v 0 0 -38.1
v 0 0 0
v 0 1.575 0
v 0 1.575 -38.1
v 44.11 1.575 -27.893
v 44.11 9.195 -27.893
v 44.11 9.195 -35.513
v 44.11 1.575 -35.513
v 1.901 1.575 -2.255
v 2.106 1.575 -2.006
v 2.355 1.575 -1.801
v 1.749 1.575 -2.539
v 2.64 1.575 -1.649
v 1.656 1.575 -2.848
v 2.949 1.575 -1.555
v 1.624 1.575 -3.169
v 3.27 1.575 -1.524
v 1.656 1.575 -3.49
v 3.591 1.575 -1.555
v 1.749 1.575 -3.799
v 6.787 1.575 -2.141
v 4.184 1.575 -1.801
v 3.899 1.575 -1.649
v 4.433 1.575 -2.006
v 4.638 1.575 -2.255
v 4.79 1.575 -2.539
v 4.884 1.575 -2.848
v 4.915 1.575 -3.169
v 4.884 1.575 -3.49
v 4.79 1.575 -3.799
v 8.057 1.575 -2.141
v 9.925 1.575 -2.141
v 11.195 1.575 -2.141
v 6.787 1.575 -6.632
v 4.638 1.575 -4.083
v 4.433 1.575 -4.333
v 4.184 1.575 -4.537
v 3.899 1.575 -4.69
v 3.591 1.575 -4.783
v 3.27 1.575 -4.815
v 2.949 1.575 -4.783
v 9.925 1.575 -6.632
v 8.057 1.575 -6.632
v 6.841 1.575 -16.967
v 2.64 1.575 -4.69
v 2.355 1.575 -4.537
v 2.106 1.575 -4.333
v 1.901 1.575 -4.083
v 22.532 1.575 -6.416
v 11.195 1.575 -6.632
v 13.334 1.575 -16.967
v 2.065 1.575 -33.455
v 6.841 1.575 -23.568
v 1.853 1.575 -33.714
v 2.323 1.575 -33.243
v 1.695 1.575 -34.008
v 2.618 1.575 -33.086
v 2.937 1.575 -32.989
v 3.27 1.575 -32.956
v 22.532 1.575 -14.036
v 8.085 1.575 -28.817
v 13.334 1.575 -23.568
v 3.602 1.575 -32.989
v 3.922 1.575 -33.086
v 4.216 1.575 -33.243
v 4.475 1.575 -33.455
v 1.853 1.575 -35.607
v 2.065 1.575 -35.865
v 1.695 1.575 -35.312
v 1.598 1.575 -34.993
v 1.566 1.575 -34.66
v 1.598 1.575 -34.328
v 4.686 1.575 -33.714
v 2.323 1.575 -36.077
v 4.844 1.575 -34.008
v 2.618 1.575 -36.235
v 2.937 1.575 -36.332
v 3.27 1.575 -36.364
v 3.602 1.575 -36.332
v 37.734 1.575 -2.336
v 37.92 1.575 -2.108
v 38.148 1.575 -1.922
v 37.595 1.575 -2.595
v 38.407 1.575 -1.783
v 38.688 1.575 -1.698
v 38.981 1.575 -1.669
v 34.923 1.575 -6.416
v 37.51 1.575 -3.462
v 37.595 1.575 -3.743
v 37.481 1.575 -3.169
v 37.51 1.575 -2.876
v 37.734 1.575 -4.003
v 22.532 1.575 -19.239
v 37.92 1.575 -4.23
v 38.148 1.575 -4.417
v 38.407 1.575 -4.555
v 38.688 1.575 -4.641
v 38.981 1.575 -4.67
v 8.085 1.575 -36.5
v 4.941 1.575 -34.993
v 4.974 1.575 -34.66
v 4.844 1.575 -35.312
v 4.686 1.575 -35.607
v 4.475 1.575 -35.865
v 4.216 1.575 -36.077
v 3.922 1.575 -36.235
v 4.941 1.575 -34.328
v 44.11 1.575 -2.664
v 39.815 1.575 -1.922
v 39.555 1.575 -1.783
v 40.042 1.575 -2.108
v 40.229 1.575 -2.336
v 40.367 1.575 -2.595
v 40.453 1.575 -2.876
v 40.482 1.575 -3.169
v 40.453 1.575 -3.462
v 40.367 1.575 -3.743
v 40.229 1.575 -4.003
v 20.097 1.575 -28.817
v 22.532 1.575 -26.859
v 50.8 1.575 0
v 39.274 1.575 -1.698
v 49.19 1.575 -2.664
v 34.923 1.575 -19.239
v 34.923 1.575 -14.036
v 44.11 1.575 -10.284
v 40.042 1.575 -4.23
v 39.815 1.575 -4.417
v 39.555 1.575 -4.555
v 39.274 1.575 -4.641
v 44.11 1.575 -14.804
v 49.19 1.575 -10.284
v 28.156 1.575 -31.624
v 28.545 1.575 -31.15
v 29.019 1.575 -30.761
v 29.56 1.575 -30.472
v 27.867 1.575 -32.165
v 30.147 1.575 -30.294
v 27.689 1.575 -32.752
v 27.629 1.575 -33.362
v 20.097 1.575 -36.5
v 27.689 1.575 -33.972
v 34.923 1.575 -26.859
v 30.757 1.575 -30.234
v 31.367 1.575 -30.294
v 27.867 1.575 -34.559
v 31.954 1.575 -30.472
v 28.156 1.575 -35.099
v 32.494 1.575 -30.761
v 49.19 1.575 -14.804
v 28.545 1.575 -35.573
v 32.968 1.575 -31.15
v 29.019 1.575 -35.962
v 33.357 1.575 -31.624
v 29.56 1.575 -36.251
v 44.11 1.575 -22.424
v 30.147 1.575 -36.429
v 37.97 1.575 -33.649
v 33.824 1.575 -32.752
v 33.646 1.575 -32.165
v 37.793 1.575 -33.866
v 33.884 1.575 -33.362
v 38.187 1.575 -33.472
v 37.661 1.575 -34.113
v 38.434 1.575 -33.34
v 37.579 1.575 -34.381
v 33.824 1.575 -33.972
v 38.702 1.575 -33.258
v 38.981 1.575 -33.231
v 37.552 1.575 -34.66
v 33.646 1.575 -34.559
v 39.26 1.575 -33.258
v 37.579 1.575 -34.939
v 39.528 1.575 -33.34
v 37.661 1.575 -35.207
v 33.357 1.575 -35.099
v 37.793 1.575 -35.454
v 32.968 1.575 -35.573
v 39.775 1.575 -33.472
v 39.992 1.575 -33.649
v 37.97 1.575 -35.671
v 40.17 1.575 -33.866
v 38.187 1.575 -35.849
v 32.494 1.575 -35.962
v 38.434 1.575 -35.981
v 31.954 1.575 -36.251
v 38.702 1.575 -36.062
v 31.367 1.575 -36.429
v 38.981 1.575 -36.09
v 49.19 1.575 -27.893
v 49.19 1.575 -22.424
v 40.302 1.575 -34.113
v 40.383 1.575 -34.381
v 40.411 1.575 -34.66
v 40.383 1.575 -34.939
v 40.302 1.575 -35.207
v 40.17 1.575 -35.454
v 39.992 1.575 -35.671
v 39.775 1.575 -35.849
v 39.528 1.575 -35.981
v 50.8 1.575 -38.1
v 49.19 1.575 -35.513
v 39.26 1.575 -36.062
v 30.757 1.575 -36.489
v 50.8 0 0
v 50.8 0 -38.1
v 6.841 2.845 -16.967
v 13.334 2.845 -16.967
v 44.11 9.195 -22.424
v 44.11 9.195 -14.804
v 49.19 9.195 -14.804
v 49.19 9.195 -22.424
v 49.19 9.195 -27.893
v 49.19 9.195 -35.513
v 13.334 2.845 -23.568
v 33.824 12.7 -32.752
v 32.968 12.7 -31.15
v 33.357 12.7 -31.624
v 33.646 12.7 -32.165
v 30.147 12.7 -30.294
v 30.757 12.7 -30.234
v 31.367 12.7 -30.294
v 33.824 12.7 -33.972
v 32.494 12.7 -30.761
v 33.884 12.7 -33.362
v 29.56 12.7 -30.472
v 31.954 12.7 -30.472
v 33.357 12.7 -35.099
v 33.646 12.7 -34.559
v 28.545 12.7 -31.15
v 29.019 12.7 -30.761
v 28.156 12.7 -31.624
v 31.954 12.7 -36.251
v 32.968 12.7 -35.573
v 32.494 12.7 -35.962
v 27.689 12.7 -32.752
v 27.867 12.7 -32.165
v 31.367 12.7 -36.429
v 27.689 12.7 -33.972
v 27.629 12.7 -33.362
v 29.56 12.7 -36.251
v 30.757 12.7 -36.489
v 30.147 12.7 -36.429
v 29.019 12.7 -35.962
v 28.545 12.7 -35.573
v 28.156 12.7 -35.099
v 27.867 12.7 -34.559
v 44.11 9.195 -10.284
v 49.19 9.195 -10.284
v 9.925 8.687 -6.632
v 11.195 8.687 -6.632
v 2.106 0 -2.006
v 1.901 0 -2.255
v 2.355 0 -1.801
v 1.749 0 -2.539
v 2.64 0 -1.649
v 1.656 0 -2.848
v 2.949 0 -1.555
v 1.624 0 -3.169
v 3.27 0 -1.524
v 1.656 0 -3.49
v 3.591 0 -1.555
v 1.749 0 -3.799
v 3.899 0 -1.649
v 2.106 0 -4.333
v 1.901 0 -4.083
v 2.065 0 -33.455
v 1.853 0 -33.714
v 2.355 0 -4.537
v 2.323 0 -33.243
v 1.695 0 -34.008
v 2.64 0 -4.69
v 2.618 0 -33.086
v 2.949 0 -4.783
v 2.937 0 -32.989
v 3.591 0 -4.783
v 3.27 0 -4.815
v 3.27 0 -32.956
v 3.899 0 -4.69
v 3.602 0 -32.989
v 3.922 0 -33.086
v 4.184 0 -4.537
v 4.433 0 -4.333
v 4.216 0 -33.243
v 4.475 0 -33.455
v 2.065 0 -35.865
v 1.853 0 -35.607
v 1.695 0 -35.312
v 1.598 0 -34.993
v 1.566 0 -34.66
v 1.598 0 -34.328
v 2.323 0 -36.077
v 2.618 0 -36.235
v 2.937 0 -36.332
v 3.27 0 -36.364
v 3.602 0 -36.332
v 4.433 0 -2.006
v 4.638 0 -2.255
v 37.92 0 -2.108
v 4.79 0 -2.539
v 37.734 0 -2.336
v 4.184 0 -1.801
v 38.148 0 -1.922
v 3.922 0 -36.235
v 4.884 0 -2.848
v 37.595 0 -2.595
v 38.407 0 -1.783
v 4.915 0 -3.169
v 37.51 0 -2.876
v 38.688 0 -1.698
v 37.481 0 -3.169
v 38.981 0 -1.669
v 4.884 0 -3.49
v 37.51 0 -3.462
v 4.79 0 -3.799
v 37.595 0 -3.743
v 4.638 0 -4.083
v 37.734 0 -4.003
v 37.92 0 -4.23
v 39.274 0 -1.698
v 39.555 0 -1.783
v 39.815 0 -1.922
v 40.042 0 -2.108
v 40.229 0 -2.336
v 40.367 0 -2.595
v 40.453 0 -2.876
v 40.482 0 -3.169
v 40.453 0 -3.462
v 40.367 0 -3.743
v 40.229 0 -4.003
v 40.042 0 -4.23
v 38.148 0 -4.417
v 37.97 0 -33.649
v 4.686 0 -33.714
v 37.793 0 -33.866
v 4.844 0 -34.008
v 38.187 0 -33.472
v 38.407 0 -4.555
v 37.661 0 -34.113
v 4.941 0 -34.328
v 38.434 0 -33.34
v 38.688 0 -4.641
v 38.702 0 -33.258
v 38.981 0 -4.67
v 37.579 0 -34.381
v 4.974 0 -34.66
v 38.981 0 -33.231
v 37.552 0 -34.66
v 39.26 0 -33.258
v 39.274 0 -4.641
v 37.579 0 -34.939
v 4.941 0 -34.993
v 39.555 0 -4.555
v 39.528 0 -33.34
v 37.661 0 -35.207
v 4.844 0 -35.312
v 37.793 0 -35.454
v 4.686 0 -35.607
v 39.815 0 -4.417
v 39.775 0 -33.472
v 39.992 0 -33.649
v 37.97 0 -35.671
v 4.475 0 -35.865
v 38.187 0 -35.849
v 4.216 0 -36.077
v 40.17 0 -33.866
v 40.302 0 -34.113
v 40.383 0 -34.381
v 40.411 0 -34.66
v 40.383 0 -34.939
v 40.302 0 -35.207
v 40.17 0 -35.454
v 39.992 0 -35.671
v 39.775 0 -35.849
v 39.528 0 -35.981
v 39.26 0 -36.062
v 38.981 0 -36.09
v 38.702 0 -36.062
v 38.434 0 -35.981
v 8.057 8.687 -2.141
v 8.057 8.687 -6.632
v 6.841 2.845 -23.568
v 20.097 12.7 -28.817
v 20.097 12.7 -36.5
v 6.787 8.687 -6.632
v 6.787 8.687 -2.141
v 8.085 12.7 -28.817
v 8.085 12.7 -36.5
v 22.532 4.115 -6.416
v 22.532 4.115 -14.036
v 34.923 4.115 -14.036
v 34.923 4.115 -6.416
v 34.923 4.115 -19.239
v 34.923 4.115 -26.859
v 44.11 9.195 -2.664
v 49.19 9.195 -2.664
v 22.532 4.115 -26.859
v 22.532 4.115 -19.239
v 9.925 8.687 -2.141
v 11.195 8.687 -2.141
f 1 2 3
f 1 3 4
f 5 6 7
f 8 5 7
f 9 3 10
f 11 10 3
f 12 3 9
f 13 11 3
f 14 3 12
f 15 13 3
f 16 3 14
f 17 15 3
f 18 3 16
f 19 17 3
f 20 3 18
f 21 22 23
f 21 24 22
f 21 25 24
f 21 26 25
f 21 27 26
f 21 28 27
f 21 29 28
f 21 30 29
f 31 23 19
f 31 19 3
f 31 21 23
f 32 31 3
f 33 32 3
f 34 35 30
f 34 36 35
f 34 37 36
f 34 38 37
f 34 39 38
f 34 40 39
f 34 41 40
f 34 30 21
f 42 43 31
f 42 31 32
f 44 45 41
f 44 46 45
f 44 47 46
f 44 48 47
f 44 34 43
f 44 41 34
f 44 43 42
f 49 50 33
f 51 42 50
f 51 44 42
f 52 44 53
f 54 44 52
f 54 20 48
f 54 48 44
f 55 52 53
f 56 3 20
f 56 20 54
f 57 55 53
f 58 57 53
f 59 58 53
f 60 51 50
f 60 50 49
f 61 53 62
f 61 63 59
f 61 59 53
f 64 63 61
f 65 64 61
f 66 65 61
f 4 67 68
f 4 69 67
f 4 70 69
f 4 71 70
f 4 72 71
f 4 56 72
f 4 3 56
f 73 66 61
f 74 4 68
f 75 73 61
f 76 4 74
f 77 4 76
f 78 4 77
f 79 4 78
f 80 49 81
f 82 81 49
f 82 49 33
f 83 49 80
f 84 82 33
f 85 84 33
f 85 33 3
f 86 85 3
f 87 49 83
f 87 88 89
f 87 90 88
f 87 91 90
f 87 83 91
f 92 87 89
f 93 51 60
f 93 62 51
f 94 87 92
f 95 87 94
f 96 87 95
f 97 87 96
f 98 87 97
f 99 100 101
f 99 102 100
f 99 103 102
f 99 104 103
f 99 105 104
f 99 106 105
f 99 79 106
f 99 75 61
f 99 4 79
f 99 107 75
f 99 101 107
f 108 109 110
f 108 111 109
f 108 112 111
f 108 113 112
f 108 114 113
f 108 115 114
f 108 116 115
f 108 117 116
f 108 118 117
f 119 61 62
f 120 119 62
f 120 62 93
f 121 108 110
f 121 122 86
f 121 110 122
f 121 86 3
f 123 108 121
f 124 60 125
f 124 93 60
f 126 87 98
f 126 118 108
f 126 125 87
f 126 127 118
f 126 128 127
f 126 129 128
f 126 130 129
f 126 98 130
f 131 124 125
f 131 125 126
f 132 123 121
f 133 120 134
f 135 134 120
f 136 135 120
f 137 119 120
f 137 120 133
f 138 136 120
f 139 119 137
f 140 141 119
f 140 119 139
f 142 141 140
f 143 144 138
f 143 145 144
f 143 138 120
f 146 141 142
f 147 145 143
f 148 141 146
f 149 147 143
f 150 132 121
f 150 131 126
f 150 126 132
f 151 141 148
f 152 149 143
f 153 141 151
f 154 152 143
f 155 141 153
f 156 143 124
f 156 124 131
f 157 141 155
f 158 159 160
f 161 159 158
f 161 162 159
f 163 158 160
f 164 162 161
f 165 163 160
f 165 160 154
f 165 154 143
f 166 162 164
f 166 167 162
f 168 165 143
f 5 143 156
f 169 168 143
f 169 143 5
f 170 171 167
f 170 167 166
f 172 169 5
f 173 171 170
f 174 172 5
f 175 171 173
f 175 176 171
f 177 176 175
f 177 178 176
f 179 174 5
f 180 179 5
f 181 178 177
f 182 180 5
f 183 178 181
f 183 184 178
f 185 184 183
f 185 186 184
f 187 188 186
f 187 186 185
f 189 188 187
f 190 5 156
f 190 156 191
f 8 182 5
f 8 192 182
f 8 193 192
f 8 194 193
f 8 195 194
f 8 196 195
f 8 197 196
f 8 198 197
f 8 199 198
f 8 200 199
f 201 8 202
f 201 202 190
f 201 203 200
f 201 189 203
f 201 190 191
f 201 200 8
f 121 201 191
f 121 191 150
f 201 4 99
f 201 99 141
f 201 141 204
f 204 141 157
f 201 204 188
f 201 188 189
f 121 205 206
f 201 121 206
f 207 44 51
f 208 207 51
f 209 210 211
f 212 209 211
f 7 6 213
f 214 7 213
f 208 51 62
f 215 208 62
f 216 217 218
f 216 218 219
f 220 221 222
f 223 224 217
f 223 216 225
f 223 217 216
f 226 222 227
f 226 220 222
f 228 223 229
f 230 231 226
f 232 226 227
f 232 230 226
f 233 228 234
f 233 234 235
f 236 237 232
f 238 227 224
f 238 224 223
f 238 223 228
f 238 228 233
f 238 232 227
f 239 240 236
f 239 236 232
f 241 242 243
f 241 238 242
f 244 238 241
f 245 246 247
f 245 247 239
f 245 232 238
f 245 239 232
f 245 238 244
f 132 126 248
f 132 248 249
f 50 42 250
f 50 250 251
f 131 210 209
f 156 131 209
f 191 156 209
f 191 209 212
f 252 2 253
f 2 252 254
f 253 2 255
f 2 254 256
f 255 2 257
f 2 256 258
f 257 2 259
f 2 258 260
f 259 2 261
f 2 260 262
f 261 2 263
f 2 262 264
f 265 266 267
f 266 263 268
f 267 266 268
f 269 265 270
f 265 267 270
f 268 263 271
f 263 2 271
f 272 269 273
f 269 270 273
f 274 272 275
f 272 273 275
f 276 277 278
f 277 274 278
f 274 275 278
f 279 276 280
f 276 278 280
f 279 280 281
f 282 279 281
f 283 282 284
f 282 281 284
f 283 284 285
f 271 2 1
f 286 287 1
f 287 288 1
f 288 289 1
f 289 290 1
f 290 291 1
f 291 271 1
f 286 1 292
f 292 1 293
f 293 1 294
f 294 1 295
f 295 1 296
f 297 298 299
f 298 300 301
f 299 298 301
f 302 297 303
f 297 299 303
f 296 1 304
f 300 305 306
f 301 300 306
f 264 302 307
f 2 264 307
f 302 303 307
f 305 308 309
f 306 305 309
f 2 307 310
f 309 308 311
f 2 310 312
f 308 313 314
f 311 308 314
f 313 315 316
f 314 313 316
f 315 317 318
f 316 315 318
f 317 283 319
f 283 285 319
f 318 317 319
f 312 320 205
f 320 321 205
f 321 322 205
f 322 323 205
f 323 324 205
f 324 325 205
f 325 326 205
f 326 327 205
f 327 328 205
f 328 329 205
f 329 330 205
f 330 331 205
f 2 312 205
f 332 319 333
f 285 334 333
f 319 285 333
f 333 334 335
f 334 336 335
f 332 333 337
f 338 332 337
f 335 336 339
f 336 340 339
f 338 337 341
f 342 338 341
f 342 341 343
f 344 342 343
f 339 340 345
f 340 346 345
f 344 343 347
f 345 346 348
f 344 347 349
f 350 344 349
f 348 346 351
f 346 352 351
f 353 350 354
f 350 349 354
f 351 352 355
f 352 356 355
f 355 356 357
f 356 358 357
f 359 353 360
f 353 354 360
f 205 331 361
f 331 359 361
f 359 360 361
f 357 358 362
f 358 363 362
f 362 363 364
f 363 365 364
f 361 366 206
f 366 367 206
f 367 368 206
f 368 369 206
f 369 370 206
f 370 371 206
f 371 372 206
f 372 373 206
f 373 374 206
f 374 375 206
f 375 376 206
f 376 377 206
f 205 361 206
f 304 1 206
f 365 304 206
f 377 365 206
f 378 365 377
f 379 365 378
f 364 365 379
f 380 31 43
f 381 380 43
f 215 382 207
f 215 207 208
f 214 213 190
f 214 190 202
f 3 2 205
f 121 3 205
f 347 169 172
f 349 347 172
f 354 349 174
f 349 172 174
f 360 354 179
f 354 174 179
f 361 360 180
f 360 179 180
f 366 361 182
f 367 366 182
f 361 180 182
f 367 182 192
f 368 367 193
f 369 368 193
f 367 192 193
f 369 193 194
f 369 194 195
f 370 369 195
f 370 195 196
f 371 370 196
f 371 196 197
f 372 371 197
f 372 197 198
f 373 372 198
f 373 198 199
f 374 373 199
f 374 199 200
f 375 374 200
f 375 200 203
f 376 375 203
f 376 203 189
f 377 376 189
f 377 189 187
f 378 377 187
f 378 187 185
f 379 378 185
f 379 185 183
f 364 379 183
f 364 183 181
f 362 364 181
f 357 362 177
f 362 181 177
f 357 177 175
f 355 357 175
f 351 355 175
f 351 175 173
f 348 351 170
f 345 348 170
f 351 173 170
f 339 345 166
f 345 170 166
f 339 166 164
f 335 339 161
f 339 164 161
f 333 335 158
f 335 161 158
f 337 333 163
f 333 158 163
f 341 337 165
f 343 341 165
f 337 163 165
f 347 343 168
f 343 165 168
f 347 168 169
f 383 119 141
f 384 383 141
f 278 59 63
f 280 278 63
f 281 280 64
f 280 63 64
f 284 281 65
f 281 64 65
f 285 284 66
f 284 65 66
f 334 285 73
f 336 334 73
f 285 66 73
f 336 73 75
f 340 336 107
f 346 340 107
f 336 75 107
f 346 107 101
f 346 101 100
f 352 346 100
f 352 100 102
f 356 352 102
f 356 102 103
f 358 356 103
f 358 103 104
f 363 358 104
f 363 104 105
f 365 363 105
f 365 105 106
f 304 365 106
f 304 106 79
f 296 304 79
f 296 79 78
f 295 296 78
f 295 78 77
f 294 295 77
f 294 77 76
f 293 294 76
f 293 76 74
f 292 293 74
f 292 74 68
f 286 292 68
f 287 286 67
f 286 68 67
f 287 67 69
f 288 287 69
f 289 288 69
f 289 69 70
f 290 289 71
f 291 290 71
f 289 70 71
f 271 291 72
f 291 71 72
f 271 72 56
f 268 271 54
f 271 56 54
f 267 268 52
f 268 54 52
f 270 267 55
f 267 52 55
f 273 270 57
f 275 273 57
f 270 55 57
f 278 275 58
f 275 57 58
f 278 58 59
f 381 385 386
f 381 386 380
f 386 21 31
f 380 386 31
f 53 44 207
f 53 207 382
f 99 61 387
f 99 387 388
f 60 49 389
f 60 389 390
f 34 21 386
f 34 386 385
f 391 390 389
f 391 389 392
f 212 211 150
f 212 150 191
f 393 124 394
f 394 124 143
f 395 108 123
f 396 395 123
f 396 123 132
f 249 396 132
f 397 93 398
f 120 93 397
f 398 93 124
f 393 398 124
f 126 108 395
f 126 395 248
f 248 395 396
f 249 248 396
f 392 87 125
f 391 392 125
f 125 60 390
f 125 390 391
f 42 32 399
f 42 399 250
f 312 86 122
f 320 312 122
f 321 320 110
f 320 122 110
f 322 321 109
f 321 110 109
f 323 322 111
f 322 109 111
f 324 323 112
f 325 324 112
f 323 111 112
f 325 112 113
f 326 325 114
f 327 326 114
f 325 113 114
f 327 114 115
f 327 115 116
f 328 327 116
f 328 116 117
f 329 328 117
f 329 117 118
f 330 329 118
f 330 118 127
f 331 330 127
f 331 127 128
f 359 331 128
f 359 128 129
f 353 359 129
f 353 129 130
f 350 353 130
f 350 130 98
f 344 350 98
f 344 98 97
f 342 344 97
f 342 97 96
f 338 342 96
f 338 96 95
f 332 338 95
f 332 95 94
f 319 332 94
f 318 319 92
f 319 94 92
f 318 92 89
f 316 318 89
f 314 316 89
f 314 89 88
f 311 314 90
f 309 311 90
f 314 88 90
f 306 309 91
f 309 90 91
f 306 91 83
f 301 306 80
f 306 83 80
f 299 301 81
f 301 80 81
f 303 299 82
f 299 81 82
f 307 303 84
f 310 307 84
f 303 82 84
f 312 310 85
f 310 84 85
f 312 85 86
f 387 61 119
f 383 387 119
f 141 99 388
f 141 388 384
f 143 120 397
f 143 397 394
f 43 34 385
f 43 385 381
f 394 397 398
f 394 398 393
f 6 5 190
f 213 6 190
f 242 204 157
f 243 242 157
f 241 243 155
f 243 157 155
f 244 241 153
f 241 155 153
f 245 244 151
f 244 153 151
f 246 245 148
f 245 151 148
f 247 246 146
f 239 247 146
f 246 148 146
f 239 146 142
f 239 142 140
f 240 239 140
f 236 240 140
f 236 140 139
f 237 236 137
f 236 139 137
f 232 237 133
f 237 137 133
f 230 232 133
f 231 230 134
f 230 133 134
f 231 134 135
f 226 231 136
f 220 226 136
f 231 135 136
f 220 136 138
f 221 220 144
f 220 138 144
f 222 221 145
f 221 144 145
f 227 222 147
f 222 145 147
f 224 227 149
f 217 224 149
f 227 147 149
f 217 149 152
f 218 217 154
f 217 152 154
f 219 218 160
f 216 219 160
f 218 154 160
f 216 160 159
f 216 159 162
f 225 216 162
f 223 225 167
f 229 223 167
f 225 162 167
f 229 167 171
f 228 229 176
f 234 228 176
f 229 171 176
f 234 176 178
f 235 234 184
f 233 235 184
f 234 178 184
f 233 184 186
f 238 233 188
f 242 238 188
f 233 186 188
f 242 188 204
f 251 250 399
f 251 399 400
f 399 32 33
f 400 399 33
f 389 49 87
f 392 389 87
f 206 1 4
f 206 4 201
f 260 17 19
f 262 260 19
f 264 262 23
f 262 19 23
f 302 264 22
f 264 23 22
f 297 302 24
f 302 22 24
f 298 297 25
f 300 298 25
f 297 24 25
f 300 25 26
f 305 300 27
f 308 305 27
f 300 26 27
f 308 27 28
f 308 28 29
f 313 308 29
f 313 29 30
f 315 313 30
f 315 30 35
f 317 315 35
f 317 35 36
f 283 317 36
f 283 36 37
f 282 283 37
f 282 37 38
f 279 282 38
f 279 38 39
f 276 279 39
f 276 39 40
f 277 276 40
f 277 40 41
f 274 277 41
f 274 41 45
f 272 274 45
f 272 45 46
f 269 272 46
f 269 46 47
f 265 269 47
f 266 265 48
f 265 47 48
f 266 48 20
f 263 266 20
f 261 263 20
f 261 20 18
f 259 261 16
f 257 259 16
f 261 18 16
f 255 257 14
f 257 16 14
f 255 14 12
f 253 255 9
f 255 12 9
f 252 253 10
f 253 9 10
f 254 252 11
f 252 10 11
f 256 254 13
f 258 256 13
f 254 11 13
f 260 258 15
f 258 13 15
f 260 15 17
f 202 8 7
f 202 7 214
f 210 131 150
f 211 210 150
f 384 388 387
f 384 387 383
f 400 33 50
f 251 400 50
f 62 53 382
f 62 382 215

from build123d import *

# Parameters (mm, degrees)
SKETCH1_W           = 50.8
SKETCH1_H           = 38.1
BOSS_EXTRUDE1_DEPTH = 1.5748
SKETCH2_W           = 5.08
SKETCH2_H           = 7.62
BOSS_EXTRUDE2_DEPTH = 7.62
SKETCH3_R           = 3.127542457
SKETCH3_W           = 12.012072663
SKETCH3_H           = 7.683397829
BOSS_EXTRUDE3_DEPTH = 11.1252
SKETCH4_W           = 12.39083171
SKETCH4_H           = 7.62
BOSS_EXTRUDE4_DEPTH = 2.54
SKETCH5_W           = 6.49301225
SKETCH5_H           = 6.601229121
BOSS_EXTRUDE5_DEPTH = 1.27
SKETCH6_W           = 1.27
SKETCH6_H           = 4.49100014
BOSS_EXTRUDE6_DEPTH = 7.112
SKETCH7_R           = 1.645643818
SKETCH7_R_2         = 1.500472866
SKETCH7_R_3         = 1.42952807
SKETCH7_R_4         = 1.703993098
CUT_EXTRUDE1_DEPTH  = 7.112


with BuildPart() as part:
    # Sketch1 → Boss-Extrude1 (new body)
    with BuildSketch(Plane(origin=(0, 0, 0), x_dir=(1, 0, 0), z_dir=(0, 1, 0))):
        with Locations((25.4, 19.05)):
            Rectangle(SKETCH1_W, SKETCH1_H)
    extrude(amount=BOSS_EXTRUDE1_DEPTH)

    # Sketch2 → Boss-Extrude2 (add)
    with BuildSketch(Plane(origin=(0, 1.5748, 0), x_dir=(1, 0, 0), z_dir=(0, 1, 0))):
        with Locations((46.649948662, 6.474433462)):
            Rectangle(SKETCH2_W, SKETCH2_H)
        with Locations((46.649948662, 18.613569988)):
            Rectangle(SKETCH2_W, SKETCH2_H)
        with Locations((46.649948662, 31.703482685)):
            Rectangle(SKETCH2_W, SKETCH2_H)
    extrude(amount=BOSS_EXTRUDE2_DEPTH)

    # Sketch3 → Boss-Extrude3 (add)
    with BuildSketch(Plane(origin=(0, 1.5748, 0), x_dir=(1, 0, 0), z_dir=(0, 1, 0))):
        with Locations(Location((30.756735106, 33.361681168, 0), (0, 0, 90))):
            Circle(SKETCH3_R)
        with Locations((14.091336998, 32.658271508)):
            Rectangle(SKETCH3_W, SKETCH3_H)
    extrude(amount=BOSS_EXTRUDE3_DEPTH)

    # Sketch4 → Boss-Extrude4 (add)
    with BuildSketch(Plane(origin=(0, 1.5748, 0), x_dir=(1, 0, 0), z_dir=(0, 1, 0))):
        with Locations((28.727668778, 23.049379524)):
            Rectangle(SKETCH4_W, SKETCH4_H)
        with Locations((28.727668778, 10.22568033)):
            Rectangle(SKETCH4_W, SKETCH4_H)
    extrude(amount=BOSS_EXTRUDE4_DEPTH)

    # Sketch5 → Boss-Extrude5 (add)
    with BuildSketch(Plane(origin=(0, 1.5748, 0), x_dir=(1, 0, 0), z_dir=(0, 1, 0))):
        with Locations((10.087312777, 20.267439796)):
            Rectangle(SKETCH5_W, SKETCH5_H)
    extrude(amount=BOSS_EXTRUDE5_DEPTH)

    # Sketch6 → Boss-Extrude6 (add)
    with BuildSketch(Plane(origin=(0, 1.5748, 0), x_dir=(1, 0, 0), z_dir=(0, 1, 0))):
        with Locations((7.421698216, 4.386614002)):
            Rectangle(SKETCH6_W, SKETCH6_H)
        with Locations((10.559987471, 4.386614002)):
            Rectangle(SKETCH6_W, SKETCH6_H)
    extrude(amount=BOSS_EXTRUDE6_DEPTH)

    # Sketch7 → Cut-Extrude1 (cut)
    with BuildSketch(Plane(origin=(0, 1.5748, 0), x_dir=(1, 0, 0), z_dir=(0, 1, 0))):
        with Locations(Location((3.269649914, 3.169174205, 0), (0, 0, 270))):
            Circle(SKETCH7_R)
        with Locations(Location((38.98121729, 3.169174205, 0), (0, 0, 270))):
            Circle(SKETCH7_R_2)
        with Locations(Location((38.98121729, 34.660283618, 0), (0, 0, 270))):
            Circle(SKETCH7_R_3)
        with Locations(Location((3.269649914, 34.660283618, 0), (0, 0, 270))):
            Circle(SKETCH7_R_4)
    extrude(amount=-CUT_EXTRUDE1_DEPTH, mode=Mode.SUBTRACT)


solid = part.part
